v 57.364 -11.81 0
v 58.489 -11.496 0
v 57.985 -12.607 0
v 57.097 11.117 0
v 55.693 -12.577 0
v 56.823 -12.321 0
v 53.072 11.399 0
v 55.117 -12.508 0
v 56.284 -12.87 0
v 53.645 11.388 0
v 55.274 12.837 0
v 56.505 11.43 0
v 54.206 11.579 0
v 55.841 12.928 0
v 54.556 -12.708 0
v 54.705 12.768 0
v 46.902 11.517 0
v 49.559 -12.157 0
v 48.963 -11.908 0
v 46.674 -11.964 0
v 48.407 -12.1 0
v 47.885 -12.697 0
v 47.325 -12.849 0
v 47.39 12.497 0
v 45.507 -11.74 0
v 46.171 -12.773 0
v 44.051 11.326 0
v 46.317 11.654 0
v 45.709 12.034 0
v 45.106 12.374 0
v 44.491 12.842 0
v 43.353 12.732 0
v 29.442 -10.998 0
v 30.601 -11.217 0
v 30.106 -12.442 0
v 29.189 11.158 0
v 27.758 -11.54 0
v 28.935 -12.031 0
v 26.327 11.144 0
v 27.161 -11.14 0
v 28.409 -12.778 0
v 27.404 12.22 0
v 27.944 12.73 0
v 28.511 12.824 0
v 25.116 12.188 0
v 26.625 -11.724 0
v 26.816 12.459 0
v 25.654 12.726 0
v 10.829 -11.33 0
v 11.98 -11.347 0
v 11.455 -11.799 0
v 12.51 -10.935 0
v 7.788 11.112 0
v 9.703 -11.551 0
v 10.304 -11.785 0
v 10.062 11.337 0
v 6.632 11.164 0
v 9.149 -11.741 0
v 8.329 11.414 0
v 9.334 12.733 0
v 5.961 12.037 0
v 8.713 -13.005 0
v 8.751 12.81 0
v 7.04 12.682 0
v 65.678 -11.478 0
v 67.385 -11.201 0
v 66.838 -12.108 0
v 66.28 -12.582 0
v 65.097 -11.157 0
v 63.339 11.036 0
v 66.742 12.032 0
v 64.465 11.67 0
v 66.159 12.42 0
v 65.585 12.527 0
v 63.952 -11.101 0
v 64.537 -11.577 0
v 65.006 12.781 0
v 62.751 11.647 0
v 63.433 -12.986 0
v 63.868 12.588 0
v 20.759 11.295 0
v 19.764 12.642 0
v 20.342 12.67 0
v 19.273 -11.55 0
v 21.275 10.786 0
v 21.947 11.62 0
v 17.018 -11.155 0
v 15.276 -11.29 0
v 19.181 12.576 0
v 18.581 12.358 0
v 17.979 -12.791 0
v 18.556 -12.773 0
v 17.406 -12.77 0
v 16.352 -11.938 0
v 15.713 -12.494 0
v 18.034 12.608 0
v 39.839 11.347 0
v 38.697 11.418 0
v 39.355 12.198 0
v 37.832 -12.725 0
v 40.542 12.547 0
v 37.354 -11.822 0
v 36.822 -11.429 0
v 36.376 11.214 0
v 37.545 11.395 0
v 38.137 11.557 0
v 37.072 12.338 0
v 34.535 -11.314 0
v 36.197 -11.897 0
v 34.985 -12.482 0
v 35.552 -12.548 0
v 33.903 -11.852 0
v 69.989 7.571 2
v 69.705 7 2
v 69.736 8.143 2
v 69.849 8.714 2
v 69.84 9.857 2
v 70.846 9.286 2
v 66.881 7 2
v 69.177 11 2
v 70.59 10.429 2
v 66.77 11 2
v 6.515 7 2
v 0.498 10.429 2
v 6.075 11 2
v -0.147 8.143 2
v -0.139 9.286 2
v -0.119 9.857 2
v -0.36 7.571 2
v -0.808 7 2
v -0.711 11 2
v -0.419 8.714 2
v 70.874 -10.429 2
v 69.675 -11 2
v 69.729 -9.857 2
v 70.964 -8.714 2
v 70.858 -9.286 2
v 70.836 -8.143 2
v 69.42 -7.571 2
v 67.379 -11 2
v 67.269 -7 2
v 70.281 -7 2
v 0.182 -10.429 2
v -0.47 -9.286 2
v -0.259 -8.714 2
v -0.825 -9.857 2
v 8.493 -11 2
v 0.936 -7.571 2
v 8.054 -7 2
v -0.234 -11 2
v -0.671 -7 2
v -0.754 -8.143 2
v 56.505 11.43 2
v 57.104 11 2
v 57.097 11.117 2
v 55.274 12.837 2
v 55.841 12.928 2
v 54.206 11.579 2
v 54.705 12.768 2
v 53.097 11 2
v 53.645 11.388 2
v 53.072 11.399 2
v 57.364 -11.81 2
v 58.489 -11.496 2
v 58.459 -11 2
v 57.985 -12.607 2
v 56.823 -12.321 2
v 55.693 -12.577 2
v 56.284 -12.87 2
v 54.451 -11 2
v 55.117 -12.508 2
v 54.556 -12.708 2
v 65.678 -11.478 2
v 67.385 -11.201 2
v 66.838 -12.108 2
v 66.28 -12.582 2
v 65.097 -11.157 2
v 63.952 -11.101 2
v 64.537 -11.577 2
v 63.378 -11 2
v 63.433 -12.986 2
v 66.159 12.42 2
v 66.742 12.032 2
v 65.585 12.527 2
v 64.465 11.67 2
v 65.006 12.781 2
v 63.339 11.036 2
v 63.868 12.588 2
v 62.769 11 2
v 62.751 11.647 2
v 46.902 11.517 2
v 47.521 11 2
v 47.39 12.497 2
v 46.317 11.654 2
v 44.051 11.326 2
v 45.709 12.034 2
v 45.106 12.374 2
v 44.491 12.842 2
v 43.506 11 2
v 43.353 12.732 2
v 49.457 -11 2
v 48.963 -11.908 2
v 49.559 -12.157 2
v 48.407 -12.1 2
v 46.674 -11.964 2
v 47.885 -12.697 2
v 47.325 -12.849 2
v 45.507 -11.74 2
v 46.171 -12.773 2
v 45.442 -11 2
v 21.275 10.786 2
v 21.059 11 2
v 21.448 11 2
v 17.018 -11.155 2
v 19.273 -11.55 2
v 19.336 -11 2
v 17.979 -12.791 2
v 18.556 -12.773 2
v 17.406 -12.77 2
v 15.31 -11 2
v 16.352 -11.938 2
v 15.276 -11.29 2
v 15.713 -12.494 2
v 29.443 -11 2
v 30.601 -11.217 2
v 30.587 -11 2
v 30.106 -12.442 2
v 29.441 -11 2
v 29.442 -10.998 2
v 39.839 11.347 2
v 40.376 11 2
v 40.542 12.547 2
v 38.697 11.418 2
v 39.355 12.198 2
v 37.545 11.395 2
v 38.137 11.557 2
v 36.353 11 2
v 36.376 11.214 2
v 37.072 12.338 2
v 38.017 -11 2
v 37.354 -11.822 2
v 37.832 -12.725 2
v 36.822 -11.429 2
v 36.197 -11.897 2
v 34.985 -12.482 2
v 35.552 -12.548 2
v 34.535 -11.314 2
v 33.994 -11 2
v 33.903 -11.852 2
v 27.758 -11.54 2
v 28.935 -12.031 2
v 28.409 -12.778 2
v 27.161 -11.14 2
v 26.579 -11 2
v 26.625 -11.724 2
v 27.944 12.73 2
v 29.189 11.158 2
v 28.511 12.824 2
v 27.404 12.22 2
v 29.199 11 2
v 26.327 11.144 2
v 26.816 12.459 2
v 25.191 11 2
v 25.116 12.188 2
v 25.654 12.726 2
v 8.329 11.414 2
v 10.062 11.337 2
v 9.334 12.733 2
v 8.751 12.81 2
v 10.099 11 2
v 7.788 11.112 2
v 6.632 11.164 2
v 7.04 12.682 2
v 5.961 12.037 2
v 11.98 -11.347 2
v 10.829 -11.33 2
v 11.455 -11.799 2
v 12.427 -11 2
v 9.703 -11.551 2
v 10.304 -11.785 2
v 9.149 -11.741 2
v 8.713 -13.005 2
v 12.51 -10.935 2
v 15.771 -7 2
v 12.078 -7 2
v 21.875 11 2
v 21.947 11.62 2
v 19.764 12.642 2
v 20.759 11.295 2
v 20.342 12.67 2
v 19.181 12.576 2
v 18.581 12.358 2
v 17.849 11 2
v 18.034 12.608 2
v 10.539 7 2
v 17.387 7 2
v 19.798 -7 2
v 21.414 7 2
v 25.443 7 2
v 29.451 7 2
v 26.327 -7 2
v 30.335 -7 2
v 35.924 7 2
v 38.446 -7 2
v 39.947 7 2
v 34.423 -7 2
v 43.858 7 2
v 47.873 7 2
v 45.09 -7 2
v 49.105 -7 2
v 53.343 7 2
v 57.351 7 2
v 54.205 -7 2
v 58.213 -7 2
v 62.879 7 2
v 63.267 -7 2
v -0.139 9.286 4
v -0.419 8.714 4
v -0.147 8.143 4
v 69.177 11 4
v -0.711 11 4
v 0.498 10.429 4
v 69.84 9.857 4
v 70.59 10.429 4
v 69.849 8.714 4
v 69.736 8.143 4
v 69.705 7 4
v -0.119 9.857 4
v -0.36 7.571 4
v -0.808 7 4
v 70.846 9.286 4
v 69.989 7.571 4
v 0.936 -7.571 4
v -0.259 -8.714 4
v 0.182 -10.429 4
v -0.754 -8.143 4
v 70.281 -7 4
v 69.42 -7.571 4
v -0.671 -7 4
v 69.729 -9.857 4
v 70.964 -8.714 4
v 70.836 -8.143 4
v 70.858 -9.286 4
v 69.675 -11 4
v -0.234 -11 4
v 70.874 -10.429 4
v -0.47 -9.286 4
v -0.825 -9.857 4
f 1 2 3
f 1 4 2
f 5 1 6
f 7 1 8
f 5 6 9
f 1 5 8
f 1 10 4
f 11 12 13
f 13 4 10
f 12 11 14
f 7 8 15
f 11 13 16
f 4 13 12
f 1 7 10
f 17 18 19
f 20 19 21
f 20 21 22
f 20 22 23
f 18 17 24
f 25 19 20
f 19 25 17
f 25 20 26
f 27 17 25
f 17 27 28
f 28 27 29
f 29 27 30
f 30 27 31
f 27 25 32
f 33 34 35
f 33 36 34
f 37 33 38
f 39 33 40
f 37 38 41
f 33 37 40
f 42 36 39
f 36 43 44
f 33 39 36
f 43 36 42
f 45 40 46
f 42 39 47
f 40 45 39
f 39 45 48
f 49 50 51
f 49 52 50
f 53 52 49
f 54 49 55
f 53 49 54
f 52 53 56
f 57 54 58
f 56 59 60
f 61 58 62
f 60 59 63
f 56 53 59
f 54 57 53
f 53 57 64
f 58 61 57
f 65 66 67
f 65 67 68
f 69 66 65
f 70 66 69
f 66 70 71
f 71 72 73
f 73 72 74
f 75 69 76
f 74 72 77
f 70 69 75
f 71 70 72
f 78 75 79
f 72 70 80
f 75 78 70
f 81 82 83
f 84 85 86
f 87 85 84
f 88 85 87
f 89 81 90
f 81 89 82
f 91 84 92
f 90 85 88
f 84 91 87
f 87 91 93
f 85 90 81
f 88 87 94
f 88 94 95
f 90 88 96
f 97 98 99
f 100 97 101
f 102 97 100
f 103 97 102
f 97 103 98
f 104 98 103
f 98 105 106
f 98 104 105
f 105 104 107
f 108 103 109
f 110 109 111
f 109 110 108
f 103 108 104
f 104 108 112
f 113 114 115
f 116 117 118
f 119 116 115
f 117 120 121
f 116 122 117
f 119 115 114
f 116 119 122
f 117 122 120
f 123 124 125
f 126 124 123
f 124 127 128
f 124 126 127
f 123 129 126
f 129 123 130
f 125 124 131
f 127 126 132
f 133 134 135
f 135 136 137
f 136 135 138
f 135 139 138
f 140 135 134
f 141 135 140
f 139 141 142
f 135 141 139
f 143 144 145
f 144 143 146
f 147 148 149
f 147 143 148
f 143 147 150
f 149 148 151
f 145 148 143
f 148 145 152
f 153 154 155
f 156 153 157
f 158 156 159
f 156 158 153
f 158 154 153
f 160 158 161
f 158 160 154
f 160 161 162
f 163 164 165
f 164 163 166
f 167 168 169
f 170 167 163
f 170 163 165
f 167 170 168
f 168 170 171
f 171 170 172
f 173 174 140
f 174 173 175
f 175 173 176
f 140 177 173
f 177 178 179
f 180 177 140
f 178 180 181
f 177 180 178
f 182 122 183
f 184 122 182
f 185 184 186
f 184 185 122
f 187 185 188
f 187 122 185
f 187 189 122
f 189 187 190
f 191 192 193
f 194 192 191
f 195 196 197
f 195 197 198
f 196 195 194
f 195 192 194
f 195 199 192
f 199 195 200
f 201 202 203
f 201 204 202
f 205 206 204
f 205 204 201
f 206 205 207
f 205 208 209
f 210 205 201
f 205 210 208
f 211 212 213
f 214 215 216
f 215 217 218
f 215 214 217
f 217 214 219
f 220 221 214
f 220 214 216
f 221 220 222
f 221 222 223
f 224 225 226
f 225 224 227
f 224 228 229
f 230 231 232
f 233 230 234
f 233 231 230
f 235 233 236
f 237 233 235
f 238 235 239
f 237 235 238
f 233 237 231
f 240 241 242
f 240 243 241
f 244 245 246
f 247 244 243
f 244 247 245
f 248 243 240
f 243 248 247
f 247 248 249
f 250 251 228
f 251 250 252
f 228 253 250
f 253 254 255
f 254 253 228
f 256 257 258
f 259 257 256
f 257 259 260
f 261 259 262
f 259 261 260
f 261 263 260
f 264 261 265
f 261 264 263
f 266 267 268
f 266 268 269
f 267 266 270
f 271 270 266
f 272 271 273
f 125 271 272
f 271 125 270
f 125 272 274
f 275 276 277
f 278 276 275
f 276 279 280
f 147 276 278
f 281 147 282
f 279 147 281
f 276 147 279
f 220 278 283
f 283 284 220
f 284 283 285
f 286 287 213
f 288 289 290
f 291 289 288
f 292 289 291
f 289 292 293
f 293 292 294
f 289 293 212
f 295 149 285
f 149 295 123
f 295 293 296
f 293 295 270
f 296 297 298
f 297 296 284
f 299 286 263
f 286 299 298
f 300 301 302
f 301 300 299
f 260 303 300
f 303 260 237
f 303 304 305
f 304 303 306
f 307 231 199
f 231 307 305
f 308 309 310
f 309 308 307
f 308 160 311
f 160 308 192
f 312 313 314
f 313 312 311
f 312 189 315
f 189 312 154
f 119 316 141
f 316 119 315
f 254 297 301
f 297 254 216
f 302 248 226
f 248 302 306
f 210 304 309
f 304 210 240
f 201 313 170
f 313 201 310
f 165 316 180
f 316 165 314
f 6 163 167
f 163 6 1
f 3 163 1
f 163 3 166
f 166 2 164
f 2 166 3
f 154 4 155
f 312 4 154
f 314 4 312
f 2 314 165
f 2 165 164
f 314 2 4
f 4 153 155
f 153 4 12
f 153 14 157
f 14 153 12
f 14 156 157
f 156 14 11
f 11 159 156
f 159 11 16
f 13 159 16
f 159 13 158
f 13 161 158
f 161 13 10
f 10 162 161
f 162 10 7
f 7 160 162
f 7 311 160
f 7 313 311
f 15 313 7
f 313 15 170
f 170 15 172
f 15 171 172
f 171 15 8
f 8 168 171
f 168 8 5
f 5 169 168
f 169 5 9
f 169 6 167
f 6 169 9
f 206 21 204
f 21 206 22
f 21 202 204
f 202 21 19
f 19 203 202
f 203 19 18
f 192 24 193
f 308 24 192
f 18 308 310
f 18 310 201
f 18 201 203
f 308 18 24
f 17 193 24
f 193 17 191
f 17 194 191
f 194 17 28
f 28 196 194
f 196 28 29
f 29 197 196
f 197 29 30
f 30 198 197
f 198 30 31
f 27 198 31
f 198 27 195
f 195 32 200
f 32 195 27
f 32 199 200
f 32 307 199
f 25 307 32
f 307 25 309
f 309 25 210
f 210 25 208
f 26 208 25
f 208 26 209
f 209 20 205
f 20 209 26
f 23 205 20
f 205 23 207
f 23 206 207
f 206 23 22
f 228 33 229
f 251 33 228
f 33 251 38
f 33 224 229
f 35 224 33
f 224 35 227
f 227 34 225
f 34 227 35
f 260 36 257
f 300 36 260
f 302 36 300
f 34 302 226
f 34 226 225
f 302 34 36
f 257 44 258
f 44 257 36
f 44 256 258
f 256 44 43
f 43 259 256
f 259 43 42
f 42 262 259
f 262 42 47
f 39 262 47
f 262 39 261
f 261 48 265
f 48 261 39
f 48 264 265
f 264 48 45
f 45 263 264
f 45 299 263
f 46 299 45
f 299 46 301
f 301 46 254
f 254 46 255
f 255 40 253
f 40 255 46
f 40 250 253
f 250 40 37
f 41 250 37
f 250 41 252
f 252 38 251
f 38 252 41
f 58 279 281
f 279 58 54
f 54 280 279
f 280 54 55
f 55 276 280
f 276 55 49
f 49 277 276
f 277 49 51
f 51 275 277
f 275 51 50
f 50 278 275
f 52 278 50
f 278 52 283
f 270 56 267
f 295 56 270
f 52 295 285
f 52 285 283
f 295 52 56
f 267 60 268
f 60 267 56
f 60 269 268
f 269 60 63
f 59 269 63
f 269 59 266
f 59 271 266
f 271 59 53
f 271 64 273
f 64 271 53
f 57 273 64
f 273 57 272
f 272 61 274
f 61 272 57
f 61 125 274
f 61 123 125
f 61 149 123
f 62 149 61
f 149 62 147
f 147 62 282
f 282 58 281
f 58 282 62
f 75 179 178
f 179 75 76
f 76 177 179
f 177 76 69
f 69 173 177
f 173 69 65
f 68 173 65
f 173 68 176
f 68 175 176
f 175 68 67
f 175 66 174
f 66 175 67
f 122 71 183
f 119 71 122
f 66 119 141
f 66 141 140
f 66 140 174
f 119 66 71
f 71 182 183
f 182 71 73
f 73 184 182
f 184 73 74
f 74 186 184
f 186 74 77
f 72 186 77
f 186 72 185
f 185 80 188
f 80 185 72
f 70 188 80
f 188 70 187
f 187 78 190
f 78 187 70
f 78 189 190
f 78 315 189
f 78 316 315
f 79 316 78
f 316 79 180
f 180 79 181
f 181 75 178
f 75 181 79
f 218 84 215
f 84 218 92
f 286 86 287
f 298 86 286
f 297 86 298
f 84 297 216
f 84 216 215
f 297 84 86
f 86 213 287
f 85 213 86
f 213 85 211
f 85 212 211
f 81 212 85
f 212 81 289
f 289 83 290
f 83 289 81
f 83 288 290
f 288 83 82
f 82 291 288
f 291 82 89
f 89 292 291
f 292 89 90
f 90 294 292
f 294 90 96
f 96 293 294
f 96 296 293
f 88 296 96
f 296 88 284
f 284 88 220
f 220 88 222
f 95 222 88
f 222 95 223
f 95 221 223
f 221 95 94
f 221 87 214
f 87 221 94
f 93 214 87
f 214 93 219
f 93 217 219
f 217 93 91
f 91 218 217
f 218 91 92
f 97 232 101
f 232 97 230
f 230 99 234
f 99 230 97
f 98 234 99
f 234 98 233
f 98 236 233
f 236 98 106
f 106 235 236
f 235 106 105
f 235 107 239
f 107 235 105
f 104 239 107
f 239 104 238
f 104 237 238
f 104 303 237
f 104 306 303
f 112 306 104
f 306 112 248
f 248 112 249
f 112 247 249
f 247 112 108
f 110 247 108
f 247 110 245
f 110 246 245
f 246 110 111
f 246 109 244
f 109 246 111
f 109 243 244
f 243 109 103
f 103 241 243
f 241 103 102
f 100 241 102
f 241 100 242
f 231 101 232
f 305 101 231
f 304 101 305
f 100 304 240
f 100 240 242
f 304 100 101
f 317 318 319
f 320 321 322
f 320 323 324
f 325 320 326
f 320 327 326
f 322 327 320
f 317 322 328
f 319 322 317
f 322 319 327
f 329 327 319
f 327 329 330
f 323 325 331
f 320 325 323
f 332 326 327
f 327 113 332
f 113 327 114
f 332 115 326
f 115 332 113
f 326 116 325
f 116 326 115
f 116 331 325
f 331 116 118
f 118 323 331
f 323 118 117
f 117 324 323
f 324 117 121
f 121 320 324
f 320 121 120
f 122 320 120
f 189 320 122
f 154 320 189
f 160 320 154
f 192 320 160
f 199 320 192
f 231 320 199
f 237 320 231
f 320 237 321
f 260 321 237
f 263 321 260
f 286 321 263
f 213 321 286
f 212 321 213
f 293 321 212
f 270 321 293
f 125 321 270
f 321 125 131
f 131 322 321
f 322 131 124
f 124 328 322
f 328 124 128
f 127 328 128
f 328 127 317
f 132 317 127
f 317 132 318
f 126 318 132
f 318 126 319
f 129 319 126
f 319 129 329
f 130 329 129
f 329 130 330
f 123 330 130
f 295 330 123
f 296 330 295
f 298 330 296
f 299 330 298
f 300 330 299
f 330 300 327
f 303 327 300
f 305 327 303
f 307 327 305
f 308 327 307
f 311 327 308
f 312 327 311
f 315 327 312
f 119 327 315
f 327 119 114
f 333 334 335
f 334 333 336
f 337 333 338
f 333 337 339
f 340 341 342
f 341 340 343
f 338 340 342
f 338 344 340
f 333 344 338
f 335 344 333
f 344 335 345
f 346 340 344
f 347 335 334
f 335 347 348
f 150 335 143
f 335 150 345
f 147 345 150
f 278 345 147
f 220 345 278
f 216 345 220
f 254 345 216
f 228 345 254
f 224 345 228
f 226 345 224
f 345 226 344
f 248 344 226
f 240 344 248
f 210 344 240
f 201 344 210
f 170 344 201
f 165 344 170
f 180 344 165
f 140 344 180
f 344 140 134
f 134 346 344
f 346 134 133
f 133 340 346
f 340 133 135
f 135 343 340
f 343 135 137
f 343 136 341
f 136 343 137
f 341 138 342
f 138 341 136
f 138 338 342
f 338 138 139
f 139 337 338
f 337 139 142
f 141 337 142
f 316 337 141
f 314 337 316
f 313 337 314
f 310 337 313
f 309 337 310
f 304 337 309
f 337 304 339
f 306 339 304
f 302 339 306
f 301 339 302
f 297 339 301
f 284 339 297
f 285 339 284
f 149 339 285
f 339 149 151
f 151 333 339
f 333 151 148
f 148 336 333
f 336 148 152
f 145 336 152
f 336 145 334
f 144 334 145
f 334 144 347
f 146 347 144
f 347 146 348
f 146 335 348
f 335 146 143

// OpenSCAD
/* woodwall.scad
 *
 * Copyright (C) Robert B. Ross, 2016
 *
 * This software is released under the Creative Commons
 * Attribution-ShareAlike 4.0 International Public License.
 */

myWidth=7;

// woodWall(height=50,crossPiece=1,supports=1);

woodLadder();


/* woodLadder()
 * length - length (height when stood up) of the ladder
 * width  - width of rungs
 */
module woodLadder(length=70,width=24)
{
   startSpace=8; // from center of crosspiece to center of crosspiece

   /* do a quick adjustment to achieve desired length */
   count = floor(length / (startSpace+1));
   actSpace = startSpace + (length/(startSpace+1)) / (count-1);

   /* rungs */
   linear_extrude(height=2) for (i=[1:count]) {
      translate([i*actSpace,0,0])
      rotate([0,0, rands(min_value=-10,max_value=10,value_count=1,
                 seed_value=13*i+2)[0]])
      translate([-2,-1*width/2,0]) plank(width=4,length=width,seed=11*i);
   }

   /* sides */
   translate([0,width/2-3,2]) rotate([0,0,-90]) linear_extrude(height=2)
   translate([-2,0,0]) plank(width=4,length=length,seed=145);

   translate([0,-1*width/2+3,2]) rotate([0,0,-90]) linear_extrude(height=2)
   translate([-2,0,0]) plank(width=4,length=length,seed=148);
}


/* woodWall()
 *
 * NOTE: Back of wall is at y=0, bottom is at z=0, left at x=0.
 */
module woodWall(height=60,length=90,crossPiece=0,supports=1,
                missing1=-1, missing2=-1)
{
   /* work out plank widths from length */
   count = length / (myWidth + 0.5);

   // +1 on Z translation is to account for random perturbations of planks.
   translate([0,-4,height+1]) rotate([-90,0,0]) union() {
      linear_extrude(height=2.0) for (i=[0:count]) {
         if (i != missing1 && i != missing2) {
            translate([i*(myWidth+0.5),0,0]) plank(width=myWidth,
                                                   length=height,seed=i);
         }
      }

      if (supports) {
         translate([myWidth/2,.95*height,1.99]) rotate([0,0,-90])
            linear_extrude(height=2.0) plank(length=count*(myWidth+0.5)-2,width=myWidth,seed=101);
         translate([myWidth/2,10,1.99]) rotate([0,0,-90])
            linear_extrude(height=2.0) plank(length=count*(myWidth+0.5)-2,width=myWidth,seed=101);
      }

      if (crossPiece) {
         cAngle = atan((height - 5*myWidth)/((count-2)*(myWidth+0.5)));

         //translate([2,17,1.99]) rotate([0,0,-65])

         translate([myWidth/2,.3*height,1.99]) rotate([0,0,cAngle-90])
            linear_extrude(height=2.0)
               plank(length=count*(myWidth+0.5),width=myWidth,seed=101);
      }
   }
}

/* plank() -- generates a 2D plank outline of specified width and length
 *
 * NOTES:
 * - Intention is that you linear_extrude this to the desired height.
 * - The seed parameter can be used to generate different rough ends.
 */
module plank(width=7,length=70,seed=1) {
   widthPoints=7; // cannot modify without editing code

   rough = rands(min_value=-1,max_value=1,value_count=2*(widthPoints+1),
                 seed_value=seed);

   polygon(points=[[0,0+rough[0]], [0,length+rough[1]],
                   [width/widthPoints,length+rough[2]],
                   [2*width/widthPoints,length+rough[3]],
                   [3*width/widthPoints,length+rough[4]],
                   [4*width/widthPoints,length+rough[5]],
                   [5*width/widthPoints,length+rough[6]],
                   [6*width/widthPoints,length+rough[7]],
                   [7*width/widthPoints,length+rough[8]],
                   [7*width/widthPoints,rough[9]],
                   [6*width/widthPoints,rough[10]],
                   [5*width/widthPoints,rough[11]],
                   [4*width/widthPoints,rough[12]],
                   [3*width/widthPoints,rough[13]],
                   [2*width/widthPoints,rough[14]],
                   [width/widthPoints,rough[15]]]);
}
